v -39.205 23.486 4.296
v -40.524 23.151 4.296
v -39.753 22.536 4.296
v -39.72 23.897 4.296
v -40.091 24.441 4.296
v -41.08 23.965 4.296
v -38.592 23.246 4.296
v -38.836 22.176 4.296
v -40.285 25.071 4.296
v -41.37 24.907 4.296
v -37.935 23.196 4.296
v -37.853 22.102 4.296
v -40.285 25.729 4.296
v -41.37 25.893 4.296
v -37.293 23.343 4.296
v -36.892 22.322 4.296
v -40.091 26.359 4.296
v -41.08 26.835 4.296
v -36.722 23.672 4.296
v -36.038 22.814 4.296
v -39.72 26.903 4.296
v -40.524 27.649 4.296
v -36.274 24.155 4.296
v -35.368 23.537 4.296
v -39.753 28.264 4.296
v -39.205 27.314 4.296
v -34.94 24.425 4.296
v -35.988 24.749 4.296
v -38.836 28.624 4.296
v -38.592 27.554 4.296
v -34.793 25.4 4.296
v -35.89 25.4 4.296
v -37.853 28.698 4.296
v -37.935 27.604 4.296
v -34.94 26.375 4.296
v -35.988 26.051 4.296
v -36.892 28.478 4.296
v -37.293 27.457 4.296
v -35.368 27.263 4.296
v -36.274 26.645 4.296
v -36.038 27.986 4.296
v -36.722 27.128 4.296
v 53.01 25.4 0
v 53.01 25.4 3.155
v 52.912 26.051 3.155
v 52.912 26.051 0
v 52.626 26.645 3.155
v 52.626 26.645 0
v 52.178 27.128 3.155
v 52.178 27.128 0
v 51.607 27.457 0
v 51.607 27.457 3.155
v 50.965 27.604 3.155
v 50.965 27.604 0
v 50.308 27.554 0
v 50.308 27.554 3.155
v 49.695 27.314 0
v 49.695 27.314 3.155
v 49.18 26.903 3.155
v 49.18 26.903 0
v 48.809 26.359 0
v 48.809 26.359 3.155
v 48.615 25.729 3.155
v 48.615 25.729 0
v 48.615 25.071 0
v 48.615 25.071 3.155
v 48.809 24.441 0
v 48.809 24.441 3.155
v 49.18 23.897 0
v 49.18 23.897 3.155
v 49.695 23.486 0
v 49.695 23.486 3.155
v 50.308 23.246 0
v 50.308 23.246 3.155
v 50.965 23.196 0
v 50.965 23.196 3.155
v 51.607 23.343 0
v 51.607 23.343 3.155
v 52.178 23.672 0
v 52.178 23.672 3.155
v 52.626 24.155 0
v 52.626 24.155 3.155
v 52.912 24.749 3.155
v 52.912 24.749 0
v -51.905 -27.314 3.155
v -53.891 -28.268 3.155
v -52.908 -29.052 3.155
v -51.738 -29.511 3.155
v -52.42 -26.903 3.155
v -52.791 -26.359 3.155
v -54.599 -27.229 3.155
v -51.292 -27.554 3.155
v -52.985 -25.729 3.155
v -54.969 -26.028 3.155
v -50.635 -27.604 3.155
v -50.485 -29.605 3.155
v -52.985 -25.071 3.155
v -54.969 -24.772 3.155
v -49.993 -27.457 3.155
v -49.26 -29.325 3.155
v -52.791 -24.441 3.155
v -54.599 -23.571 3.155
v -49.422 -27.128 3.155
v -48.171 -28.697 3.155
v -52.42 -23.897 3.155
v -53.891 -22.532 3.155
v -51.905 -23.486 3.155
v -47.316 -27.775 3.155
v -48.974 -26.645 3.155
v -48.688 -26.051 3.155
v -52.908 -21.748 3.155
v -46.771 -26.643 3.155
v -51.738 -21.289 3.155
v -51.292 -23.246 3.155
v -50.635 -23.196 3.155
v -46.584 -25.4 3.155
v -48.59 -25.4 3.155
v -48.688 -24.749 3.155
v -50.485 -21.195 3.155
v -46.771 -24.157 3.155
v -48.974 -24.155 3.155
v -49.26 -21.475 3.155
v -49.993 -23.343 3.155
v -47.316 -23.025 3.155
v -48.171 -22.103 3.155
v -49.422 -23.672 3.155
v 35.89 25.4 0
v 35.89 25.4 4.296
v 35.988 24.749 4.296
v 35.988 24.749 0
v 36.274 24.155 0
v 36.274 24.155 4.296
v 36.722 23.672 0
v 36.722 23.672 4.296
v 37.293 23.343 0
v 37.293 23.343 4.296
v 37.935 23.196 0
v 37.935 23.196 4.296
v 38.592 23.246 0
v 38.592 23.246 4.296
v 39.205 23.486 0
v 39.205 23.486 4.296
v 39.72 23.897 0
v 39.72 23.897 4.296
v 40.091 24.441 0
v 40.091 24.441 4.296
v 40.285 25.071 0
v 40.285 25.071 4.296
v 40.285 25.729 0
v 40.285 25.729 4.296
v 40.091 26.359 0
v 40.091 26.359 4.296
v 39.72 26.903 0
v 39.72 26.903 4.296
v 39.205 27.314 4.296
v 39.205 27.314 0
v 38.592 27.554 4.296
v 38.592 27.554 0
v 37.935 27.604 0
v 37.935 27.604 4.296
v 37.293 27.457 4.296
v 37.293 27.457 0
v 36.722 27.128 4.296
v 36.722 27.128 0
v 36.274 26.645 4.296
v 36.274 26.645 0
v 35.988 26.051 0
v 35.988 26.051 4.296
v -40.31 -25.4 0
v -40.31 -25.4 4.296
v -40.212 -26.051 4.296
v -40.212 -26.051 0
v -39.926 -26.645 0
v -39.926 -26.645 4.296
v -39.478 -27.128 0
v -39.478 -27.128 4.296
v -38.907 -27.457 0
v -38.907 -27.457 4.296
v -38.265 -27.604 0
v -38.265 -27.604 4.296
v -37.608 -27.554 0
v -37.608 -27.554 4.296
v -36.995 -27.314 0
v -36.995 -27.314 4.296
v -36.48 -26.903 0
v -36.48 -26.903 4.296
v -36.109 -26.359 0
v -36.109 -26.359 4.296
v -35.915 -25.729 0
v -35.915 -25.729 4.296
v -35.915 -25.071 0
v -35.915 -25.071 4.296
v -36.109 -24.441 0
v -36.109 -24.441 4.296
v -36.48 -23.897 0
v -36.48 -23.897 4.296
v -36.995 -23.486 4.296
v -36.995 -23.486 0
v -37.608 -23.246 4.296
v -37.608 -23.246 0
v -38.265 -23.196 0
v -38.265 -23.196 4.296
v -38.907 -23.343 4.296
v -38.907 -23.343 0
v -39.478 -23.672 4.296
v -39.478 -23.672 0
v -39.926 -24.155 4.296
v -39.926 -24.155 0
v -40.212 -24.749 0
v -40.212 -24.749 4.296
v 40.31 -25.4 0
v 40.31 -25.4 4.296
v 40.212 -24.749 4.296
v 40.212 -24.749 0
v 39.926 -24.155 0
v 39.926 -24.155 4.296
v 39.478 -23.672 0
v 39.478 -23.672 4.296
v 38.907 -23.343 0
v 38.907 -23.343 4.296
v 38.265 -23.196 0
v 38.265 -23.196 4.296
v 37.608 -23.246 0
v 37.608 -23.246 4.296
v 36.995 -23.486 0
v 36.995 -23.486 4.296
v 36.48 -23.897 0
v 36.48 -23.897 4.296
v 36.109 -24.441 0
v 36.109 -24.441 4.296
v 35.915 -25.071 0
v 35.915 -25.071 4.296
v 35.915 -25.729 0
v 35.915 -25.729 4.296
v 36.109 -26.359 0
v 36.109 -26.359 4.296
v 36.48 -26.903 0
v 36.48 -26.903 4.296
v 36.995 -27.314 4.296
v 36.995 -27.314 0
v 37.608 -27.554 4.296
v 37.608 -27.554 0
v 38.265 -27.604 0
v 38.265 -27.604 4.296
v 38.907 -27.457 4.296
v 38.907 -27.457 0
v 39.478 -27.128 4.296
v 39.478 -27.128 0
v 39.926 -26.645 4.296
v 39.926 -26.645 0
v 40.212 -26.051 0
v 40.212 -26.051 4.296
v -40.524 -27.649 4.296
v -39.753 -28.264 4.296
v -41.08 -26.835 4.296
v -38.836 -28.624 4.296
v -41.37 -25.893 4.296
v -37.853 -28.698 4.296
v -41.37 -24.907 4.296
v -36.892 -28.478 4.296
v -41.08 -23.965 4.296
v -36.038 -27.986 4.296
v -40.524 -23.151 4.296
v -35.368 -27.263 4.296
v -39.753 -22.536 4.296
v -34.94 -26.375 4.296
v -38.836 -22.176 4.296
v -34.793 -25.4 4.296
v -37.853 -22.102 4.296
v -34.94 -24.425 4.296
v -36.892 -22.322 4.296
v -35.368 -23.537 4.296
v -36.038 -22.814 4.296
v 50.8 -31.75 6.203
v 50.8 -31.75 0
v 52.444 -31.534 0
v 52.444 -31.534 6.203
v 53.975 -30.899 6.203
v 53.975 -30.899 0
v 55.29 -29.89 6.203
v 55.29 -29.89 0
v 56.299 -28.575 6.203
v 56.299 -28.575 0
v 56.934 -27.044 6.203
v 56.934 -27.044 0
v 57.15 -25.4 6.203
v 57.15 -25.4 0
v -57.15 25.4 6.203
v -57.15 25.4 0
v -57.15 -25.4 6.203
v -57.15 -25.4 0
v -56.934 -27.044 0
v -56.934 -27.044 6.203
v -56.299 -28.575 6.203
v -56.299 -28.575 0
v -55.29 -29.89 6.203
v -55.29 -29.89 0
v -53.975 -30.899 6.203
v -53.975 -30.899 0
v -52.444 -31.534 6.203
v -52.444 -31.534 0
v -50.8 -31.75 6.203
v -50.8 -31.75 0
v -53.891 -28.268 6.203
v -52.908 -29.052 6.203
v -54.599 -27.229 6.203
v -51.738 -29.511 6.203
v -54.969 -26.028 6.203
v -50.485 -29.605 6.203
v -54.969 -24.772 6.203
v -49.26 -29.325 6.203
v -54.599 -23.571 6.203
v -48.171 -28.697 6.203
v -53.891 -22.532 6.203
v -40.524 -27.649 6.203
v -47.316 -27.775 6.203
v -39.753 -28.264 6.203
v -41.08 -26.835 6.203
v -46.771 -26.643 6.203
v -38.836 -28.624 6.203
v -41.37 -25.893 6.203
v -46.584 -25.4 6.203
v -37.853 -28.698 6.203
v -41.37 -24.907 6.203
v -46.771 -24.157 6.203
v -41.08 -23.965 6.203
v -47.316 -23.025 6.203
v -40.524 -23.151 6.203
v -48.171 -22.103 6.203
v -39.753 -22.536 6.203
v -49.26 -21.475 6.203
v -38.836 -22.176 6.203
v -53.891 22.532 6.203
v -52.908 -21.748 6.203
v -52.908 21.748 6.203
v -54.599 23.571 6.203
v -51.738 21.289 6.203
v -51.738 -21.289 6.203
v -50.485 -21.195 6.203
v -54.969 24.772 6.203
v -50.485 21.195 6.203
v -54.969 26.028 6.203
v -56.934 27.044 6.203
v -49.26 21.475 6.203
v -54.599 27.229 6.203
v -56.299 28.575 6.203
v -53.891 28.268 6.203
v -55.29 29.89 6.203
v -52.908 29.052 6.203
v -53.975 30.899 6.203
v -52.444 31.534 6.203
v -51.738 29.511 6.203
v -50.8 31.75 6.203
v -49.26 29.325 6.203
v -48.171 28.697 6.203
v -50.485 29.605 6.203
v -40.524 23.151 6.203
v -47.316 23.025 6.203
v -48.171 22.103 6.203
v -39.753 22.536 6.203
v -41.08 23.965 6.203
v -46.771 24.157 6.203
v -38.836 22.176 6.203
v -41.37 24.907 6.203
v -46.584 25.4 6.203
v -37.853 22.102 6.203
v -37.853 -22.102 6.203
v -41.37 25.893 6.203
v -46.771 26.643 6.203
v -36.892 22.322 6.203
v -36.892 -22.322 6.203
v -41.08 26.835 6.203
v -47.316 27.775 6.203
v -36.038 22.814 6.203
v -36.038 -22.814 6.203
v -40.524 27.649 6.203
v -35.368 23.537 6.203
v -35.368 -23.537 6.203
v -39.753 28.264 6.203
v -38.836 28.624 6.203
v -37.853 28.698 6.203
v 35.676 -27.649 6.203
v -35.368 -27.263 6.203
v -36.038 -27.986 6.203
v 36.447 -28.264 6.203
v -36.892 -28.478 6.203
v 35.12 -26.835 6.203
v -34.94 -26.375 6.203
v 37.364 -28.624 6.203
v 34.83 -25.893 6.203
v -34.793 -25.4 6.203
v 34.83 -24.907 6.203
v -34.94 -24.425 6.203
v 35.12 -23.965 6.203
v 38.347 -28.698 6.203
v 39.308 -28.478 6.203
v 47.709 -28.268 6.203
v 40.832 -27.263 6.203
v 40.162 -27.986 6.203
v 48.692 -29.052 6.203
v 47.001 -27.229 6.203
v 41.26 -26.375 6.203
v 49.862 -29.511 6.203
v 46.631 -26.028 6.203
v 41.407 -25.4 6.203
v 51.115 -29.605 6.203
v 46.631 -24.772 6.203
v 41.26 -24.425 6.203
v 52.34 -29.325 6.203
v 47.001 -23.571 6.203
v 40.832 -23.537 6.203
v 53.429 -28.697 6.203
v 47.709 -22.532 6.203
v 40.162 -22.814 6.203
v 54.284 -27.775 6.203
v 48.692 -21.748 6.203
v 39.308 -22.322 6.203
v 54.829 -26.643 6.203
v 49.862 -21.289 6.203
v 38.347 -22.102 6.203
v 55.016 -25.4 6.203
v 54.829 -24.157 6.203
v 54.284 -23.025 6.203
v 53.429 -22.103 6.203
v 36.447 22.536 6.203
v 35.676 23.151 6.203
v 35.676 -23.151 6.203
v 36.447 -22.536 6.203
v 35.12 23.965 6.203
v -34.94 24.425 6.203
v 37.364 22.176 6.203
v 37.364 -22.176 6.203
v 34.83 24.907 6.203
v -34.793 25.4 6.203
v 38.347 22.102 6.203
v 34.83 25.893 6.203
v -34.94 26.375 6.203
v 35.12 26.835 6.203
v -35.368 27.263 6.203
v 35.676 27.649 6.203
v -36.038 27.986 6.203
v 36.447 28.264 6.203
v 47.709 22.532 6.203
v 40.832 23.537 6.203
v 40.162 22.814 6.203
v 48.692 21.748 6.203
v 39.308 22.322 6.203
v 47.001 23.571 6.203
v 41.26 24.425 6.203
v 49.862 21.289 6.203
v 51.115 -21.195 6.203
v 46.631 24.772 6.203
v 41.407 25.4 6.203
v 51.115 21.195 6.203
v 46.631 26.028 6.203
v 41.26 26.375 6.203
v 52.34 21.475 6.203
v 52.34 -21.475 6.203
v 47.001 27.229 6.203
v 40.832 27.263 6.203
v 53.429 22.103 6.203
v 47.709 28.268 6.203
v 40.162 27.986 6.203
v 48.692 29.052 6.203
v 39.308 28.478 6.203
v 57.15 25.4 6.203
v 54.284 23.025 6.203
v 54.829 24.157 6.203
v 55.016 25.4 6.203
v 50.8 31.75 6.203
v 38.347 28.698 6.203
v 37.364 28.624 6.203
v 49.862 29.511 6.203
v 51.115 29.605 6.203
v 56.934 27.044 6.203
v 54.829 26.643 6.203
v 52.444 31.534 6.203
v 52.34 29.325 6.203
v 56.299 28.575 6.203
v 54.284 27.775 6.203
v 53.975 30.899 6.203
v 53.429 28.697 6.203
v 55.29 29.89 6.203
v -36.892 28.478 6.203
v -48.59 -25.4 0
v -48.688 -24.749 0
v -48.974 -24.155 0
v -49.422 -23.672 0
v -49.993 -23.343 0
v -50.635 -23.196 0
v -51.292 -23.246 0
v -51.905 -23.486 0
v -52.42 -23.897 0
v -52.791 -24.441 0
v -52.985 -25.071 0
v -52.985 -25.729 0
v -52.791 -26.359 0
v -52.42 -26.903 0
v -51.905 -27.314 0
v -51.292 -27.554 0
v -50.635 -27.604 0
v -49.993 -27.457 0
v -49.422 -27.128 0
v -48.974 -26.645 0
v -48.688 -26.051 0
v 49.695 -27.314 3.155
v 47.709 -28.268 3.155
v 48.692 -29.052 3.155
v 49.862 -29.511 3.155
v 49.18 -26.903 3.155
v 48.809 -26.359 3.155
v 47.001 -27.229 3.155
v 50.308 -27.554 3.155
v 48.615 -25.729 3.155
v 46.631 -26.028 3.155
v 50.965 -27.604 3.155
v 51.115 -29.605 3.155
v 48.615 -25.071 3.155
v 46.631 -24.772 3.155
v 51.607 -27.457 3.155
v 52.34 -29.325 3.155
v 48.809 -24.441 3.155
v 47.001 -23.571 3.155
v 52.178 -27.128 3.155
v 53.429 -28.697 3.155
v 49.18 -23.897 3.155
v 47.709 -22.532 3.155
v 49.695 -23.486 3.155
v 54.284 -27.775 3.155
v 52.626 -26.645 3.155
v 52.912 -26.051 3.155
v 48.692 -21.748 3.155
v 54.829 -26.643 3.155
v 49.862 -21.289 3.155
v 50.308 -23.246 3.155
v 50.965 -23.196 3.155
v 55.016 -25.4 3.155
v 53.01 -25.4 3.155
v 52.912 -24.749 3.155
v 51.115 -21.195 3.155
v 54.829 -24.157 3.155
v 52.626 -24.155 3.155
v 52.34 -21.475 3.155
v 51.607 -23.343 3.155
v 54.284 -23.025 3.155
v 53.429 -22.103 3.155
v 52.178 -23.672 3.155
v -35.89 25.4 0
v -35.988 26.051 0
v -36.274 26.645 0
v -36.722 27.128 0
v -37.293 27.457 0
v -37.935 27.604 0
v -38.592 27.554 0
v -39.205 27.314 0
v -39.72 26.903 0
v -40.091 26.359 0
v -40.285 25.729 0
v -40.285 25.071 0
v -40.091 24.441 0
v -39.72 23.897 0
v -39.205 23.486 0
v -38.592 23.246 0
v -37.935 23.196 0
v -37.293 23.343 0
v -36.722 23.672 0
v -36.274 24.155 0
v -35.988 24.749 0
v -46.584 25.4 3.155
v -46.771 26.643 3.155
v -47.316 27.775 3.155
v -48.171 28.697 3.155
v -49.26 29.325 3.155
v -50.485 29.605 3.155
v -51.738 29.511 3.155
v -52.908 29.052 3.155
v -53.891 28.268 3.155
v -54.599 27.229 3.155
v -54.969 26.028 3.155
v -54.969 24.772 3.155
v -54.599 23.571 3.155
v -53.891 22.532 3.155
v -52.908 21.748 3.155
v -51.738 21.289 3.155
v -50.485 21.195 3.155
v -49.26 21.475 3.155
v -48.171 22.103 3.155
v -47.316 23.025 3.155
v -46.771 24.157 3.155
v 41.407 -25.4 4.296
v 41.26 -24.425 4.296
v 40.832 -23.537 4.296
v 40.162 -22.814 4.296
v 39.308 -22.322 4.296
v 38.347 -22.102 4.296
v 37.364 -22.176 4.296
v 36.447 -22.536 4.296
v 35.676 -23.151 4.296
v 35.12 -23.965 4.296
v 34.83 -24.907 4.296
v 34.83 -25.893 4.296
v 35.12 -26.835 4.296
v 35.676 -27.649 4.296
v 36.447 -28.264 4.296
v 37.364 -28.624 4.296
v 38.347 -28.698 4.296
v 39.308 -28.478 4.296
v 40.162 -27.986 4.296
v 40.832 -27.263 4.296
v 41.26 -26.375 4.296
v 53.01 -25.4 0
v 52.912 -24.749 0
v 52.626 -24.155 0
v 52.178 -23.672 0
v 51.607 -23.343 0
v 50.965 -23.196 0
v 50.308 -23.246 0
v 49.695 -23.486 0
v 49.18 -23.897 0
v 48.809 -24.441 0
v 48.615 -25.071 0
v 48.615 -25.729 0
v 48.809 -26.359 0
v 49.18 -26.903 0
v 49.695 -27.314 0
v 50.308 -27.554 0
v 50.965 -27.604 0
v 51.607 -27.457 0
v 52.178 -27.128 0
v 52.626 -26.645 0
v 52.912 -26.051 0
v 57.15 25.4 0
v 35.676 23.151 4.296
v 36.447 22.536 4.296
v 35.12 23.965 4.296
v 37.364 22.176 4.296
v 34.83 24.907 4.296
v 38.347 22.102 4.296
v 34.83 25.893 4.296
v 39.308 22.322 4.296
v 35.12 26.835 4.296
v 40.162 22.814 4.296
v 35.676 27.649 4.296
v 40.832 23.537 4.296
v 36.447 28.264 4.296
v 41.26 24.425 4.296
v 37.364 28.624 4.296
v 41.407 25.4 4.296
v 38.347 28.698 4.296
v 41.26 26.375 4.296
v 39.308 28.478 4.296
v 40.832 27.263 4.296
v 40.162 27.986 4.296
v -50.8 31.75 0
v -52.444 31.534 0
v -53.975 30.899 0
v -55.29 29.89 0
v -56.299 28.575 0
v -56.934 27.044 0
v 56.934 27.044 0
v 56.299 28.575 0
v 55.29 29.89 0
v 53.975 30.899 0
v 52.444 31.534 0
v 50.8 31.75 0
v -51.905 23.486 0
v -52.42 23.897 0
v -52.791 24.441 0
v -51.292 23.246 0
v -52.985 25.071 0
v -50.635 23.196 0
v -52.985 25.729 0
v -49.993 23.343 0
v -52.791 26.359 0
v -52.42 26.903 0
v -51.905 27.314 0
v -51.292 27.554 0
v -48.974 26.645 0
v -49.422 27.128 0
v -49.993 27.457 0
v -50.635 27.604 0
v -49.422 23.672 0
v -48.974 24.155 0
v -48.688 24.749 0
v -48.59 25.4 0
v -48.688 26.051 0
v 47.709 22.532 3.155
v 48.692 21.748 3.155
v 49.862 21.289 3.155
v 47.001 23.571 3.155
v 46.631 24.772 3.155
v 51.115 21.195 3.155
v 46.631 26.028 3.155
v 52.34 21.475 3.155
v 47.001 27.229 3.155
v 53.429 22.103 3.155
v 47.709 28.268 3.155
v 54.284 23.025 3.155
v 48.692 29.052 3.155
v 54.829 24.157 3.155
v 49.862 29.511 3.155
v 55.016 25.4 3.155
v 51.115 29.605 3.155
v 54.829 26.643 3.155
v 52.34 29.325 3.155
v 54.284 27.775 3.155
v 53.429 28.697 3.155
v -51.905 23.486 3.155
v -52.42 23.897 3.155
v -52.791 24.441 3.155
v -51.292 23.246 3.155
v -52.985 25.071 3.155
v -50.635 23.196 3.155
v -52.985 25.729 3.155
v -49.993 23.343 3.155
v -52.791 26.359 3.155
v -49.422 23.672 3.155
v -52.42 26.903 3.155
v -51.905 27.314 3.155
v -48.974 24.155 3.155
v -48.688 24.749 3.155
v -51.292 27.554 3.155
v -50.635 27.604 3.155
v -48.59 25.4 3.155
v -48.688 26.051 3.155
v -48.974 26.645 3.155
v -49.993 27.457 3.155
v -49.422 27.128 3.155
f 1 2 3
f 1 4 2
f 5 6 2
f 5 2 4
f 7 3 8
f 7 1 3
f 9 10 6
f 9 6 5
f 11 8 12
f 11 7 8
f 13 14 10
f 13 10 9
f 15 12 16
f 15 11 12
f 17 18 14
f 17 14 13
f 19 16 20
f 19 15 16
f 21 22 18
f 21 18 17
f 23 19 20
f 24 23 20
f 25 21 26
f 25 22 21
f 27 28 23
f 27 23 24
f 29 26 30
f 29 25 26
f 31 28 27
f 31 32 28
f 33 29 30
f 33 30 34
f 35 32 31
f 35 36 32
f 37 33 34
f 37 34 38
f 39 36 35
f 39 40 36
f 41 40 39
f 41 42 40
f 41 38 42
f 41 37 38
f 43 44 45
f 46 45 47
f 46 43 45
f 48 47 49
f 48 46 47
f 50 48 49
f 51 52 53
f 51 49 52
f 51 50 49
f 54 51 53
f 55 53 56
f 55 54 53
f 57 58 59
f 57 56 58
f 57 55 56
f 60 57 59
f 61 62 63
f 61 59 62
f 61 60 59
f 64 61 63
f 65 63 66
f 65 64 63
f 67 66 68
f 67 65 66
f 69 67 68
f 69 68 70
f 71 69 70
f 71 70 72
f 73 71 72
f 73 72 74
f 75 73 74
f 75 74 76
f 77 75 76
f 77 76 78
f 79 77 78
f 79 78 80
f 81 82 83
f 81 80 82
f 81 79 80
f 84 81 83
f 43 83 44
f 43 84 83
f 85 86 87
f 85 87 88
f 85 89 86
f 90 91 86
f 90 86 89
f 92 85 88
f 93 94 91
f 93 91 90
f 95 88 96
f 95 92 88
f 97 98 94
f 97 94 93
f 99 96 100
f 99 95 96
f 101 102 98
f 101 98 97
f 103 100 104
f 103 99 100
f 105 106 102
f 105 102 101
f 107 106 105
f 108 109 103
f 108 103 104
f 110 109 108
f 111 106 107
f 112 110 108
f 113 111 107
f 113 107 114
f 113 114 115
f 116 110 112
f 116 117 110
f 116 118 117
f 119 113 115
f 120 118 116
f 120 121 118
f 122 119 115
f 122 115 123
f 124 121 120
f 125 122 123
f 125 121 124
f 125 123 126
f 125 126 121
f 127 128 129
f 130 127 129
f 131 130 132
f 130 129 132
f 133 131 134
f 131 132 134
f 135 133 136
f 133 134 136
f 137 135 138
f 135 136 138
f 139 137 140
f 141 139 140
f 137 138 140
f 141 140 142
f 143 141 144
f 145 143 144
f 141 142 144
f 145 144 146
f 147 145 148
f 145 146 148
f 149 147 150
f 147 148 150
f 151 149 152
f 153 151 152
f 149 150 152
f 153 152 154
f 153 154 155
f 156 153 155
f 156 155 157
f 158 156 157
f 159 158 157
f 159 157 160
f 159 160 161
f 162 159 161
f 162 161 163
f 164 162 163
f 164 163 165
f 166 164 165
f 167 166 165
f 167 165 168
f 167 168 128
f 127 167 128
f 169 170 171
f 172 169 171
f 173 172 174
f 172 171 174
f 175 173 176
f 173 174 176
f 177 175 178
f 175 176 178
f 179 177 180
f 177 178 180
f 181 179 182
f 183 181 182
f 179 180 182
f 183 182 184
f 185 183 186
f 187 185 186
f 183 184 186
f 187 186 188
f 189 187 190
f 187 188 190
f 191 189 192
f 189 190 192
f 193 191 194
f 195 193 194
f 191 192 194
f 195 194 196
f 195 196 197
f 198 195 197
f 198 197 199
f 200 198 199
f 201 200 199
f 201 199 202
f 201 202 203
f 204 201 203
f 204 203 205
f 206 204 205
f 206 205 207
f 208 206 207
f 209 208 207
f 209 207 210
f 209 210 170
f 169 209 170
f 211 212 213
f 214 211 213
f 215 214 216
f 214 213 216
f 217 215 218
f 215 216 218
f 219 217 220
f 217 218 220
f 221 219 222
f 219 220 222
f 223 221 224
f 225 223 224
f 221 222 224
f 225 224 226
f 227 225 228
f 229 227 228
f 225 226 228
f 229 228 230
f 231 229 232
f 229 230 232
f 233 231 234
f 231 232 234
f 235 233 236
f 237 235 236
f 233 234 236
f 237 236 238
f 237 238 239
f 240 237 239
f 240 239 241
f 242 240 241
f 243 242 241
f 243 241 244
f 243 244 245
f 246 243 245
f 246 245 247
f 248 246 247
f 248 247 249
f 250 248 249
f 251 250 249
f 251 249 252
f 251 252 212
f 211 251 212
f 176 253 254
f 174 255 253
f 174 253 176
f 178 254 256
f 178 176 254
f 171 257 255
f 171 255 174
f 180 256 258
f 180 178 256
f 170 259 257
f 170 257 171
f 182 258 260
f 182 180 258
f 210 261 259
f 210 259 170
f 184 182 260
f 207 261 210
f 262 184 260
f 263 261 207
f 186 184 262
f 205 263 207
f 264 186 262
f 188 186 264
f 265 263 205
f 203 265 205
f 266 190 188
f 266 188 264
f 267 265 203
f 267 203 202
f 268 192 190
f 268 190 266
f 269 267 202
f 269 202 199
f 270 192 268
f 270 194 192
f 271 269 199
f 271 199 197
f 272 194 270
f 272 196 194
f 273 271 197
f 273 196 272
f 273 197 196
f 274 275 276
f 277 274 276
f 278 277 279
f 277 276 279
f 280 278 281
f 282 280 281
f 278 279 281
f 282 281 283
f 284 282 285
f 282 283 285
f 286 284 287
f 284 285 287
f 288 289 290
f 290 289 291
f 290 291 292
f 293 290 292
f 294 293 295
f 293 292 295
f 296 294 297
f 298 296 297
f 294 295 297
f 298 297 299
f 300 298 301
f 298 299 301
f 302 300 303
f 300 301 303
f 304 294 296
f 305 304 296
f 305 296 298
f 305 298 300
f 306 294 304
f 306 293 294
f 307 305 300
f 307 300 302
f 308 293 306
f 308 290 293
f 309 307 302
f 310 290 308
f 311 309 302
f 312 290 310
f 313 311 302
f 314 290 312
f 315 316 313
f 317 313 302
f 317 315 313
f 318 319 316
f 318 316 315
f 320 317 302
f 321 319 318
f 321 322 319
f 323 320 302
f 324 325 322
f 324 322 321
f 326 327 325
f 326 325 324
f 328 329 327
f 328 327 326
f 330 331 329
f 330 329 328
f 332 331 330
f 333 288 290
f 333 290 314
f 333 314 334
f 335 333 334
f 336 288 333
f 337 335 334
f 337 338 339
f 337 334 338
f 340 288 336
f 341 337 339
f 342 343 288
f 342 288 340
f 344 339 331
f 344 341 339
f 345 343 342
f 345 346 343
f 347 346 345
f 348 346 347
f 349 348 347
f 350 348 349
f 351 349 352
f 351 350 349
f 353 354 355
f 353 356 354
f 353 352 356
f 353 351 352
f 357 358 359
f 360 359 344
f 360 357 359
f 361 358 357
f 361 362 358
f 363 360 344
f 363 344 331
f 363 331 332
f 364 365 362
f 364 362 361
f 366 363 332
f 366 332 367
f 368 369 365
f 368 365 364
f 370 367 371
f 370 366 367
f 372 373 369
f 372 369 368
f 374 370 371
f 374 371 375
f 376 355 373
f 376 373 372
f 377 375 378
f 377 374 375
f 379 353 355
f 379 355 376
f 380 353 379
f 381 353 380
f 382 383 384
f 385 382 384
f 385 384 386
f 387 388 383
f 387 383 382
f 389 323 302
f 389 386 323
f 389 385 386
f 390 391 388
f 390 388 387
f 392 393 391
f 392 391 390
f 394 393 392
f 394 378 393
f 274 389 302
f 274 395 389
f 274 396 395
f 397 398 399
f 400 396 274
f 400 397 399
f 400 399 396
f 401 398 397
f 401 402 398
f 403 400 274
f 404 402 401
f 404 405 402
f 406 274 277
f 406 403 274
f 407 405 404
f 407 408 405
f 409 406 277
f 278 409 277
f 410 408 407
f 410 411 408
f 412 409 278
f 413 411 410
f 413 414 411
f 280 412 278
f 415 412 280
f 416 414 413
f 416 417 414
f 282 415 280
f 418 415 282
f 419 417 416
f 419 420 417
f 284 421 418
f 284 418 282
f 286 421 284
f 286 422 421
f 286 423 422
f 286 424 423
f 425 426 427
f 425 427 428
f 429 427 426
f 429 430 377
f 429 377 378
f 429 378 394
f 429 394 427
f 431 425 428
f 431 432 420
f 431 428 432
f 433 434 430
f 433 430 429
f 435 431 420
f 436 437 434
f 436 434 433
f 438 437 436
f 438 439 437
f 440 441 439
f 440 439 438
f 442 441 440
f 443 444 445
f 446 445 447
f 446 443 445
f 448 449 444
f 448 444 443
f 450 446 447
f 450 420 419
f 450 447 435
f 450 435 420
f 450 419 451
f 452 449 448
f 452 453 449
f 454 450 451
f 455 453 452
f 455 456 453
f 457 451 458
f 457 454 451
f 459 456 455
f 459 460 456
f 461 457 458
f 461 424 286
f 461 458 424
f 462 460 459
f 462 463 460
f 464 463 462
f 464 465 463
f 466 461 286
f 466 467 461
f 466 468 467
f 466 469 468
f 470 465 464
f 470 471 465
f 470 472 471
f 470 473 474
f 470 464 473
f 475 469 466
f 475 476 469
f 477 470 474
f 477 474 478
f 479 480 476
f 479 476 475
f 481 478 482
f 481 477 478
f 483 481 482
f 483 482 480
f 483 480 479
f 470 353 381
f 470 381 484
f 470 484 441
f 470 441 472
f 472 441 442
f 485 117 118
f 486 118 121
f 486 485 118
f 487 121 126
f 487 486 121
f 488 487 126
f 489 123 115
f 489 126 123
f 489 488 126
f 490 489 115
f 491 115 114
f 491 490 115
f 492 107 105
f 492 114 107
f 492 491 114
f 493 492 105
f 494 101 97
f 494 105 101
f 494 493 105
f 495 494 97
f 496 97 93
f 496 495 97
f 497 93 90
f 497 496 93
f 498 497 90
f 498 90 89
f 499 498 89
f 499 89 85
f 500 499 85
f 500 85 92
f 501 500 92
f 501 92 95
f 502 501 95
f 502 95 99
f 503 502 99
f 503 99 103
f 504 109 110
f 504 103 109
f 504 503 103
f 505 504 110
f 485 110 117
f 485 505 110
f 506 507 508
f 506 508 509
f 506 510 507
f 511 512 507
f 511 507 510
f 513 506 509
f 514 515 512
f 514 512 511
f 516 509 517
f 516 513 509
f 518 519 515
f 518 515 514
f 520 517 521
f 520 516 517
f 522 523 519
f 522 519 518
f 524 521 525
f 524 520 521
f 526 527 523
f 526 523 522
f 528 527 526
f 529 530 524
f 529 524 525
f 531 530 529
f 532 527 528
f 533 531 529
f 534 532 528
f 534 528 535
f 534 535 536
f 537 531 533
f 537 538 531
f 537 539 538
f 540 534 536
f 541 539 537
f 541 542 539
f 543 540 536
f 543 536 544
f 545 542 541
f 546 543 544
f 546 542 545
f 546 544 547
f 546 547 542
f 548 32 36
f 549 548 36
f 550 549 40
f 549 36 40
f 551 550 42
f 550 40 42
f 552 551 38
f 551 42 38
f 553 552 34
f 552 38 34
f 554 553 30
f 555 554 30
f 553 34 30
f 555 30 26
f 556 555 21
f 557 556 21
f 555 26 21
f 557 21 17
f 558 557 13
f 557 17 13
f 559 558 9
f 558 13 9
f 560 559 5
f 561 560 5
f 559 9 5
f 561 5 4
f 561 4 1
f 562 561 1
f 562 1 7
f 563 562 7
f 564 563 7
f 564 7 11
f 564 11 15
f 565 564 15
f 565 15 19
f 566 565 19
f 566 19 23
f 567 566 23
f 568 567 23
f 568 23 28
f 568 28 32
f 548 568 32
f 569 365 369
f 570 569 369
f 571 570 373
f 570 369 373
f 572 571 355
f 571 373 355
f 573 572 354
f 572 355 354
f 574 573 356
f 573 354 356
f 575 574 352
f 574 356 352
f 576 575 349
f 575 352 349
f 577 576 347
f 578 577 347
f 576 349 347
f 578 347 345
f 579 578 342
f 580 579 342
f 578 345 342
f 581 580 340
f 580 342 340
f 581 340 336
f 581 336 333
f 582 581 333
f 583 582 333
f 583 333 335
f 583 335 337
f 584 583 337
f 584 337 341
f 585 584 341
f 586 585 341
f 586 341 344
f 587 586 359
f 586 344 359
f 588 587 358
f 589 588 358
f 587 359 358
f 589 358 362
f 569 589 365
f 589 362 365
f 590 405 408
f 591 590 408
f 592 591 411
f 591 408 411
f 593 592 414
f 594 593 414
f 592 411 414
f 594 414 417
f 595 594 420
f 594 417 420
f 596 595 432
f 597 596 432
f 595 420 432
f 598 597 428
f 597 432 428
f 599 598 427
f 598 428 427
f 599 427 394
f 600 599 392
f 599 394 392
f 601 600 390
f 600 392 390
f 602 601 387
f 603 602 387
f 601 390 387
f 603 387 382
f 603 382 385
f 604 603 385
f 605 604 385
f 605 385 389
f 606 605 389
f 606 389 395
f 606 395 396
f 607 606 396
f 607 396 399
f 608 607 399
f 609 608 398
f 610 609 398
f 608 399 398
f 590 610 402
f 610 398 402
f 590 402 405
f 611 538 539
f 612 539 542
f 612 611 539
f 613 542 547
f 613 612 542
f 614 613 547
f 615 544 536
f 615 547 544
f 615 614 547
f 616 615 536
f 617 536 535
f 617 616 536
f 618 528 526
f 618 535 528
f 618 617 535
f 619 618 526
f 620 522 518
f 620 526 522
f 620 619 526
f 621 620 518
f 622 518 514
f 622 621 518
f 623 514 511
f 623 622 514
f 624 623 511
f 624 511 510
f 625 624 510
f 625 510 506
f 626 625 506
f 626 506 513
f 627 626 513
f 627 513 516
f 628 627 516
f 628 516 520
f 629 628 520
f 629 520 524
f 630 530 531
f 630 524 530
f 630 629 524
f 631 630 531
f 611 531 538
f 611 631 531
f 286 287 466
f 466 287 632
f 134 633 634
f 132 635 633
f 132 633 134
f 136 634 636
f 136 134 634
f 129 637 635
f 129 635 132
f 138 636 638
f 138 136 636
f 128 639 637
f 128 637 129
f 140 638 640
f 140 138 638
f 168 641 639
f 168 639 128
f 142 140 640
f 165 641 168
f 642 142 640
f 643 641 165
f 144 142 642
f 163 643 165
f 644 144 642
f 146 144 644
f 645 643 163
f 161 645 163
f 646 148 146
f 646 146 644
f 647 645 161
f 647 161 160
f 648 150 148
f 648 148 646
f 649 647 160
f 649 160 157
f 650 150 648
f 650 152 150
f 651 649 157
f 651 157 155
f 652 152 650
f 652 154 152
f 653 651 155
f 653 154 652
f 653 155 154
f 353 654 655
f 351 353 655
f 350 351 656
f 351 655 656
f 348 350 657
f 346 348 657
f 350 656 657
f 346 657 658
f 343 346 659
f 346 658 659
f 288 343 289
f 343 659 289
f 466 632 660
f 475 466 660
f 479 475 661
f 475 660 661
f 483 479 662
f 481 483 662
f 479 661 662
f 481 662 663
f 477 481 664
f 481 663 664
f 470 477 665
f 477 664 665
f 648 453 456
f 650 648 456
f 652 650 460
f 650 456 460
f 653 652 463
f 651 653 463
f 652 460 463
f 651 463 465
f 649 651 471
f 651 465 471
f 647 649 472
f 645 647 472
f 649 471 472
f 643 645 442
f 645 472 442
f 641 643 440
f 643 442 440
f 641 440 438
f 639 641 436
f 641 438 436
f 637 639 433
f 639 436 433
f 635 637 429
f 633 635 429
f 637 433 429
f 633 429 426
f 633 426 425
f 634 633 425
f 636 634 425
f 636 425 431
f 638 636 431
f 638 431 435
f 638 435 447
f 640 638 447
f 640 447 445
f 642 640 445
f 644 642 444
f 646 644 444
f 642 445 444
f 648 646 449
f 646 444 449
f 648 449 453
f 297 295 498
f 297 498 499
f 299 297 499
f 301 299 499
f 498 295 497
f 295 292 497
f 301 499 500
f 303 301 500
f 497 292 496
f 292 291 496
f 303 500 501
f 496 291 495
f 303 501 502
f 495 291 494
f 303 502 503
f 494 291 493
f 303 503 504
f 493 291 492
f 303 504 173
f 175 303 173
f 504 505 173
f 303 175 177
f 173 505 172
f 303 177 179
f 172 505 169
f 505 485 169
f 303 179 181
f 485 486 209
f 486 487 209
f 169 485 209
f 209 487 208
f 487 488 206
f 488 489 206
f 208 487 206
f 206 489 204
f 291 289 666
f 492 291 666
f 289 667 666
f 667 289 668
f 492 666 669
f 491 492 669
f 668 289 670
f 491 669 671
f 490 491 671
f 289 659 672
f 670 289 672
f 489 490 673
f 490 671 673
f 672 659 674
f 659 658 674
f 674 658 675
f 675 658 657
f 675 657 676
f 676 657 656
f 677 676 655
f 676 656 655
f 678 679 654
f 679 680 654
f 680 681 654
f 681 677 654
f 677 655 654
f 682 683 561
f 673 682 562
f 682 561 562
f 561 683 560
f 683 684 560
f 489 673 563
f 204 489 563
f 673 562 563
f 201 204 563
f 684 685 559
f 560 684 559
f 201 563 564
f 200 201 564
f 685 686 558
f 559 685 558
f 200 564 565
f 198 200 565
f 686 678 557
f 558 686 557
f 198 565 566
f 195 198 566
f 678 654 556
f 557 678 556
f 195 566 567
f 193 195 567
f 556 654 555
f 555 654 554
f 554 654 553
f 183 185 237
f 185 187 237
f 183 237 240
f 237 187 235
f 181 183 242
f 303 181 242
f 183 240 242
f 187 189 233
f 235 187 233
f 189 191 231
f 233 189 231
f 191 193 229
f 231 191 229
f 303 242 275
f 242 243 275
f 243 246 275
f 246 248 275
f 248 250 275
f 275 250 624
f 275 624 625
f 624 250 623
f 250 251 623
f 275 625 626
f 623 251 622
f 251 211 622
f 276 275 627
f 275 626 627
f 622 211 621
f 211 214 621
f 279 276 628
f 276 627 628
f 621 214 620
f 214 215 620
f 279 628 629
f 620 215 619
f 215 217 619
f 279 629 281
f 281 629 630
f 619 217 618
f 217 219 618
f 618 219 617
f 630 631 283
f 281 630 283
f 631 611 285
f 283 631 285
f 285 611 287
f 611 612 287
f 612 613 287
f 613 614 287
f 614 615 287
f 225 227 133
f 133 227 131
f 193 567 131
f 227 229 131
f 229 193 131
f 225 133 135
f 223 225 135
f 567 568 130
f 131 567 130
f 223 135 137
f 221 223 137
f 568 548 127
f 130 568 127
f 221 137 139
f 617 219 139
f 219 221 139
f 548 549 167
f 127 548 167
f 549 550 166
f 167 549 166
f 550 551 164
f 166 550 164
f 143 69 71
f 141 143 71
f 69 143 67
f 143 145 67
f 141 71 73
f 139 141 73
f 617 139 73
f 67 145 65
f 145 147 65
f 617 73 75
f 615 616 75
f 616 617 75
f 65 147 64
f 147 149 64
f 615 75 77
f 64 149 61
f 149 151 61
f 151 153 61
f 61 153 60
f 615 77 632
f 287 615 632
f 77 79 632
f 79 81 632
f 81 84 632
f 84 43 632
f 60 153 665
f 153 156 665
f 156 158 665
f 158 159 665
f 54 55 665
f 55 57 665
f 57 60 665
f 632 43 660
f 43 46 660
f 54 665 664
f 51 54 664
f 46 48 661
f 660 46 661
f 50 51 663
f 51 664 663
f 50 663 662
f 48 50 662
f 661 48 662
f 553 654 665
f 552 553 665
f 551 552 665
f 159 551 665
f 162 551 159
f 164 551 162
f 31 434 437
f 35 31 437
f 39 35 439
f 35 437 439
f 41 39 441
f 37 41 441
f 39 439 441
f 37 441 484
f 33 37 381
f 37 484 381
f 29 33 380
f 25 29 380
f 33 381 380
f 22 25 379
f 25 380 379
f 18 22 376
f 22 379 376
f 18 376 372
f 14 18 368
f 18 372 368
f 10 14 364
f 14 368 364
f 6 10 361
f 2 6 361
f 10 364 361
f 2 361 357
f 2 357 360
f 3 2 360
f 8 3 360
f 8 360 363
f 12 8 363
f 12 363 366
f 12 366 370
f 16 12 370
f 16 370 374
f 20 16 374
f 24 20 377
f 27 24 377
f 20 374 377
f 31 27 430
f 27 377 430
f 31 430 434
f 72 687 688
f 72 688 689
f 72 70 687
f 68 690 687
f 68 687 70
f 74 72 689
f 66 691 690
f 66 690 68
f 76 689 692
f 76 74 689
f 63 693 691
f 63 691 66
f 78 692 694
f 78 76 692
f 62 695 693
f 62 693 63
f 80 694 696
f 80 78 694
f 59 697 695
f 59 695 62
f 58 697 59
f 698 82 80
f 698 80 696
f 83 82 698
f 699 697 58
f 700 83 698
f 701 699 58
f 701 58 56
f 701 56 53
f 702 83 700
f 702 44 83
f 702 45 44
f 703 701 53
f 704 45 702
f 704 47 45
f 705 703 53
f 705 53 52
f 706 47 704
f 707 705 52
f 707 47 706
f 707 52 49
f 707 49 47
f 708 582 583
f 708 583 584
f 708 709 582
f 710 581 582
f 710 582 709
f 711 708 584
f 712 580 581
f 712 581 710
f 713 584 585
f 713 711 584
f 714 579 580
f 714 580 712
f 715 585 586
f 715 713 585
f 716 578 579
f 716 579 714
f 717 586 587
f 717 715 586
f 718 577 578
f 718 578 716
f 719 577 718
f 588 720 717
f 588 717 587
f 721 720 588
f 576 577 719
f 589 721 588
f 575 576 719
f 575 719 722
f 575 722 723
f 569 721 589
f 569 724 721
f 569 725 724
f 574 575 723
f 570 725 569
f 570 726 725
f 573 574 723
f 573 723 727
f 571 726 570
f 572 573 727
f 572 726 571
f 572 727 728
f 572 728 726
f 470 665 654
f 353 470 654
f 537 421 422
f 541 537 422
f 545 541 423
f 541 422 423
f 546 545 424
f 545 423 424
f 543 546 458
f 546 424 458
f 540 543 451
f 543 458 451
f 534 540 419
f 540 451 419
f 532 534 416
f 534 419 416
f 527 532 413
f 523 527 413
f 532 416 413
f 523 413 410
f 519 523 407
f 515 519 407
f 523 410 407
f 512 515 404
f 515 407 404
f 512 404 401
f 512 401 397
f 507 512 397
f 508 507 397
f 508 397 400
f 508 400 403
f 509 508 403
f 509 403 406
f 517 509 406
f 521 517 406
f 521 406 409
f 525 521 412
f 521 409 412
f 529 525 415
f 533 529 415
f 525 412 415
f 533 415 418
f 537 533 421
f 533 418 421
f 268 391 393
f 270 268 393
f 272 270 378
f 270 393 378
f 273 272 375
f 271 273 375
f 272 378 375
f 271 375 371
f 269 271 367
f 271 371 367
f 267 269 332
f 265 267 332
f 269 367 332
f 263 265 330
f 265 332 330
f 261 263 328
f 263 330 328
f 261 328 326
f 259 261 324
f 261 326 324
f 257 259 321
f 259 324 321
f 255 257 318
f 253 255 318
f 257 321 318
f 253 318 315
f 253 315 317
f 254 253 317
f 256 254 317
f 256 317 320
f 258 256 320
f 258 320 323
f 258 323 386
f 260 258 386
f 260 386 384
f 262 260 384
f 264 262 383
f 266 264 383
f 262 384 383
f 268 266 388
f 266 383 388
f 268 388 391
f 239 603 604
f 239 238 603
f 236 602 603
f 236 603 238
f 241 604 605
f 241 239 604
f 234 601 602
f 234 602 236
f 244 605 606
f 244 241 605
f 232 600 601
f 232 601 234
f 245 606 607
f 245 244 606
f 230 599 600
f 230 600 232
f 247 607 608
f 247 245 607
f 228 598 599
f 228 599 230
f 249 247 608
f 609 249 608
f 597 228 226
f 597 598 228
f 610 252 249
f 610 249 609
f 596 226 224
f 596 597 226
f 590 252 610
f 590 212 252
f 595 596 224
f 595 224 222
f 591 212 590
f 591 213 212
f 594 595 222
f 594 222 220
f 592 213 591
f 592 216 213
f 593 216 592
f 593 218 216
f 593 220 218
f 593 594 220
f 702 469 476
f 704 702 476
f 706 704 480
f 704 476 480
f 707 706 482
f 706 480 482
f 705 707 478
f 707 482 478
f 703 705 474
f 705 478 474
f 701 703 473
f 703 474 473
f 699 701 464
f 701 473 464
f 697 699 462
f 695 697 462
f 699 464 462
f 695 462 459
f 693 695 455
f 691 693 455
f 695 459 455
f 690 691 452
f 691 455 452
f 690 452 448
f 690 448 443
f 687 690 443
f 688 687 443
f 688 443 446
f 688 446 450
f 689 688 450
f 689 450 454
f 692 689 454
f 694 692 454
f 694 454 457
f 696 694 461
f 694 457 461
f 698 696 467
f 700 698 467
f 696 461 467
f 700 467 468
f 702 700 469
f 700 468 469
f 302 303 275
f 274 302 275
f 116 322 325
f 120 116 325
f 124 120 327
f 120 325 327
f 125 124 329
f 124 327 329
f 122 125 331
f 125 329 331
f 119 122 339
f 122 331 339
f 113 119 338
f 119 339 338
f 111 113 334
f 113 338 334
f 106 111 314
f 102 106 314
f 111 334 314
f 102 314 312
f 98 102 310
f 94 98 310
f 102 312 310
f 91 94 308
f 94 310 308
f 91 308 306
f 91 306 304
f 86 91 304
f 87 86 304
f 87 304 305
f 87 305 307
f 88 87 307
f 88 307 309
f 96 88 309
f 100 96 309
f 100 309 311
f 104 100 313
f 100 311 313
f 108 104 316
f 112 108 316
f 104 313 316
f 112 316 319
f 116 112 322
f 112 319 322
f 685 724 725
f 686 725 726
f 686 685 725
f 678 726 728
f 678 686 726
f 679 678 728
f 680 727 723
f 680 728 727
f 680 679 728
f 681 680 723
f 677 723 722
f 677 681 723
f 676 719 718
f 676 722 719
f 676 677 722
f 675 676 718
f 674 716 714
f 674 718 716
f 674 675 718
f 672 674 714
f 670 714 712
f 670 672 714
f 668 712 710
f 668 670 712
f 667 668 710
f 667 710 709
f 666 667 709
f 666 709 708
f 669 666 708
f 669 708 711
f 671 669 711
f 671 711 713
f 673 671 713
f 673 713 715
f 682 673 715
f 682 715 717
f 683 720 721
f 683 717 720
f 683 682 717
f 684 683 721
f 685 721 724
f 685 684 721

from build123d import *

# Parameters (mm, degrees)
SKETCH1_R           = 2.2098
BOSS_EXTRUDE1_DEPTH = 6.20300004
SKETCH2_R           = 4.2164
CUT_EXTRUDE1_DEPTH  = 3.048
SKETCH3_R           = 2.2098
CUT_EXTRUDE2_DEPTH  = 66.670862713
SKETCH4_R           = 3.30699999
CUT_EXTRUDE3_DEPTH  = 1.906999996


with BuildPart() as part:
    # Sketch1 → Boss-Extrude1 (new body)
    with BuildSketch(Plane.XY):
        with BuildLine():
            Line((-50.8, -31.75), (50.8, -31.75))
            ThreePointArc((50.8, -31.75), (55.290128061, -29.890128061), (57.15, -25.4))
            Line((57.15, -25.4), (57.15, 25.4))
            ThreePointArc((57.15, 25.4), (55.290128061, 29.890128061), (50.8, 31.75))
            Line((50.8, 31.75), (-50.8, 31.75))
            ThreePointArc((-50.8, 31.75), (-55.290128061, 29.890128061), (-57.15, 25.4))
            Line((-57.15, 25.4), (-57.15, -25.4))
            ThreePointArc((-57.15, -25.4), (-55.290128061, -29.890128061), (-50.8, -31.75))
        make_face()
        with Locations((-50.8, -25.4)):
            Circle(SKETCH1_R, mode=Mode.SUBTRACT)
        with Locations((-50.8, 25.4)):
            Circle(SKETCH1_R, mode=Mode.SUBTRACT)
        with Locations((50.8, 25.4)):
            Circle(SKETCH1_R, mode=Mode.SUBTRACT)
        with Locations((50.8, -25.4)):
            Circle(SKETCH1_R, mode=Mode.SUBTRACT)
    extrude(amount=BOSS_EXTRUDE1_DEPTH)

    # Sketch2 → Cut-Extrude1 (cut)
    with BuildSketch(Plane.XY.offset(6.20300004)):
        with Locations((-50.8, 25.4)):
            Circle(SKETCH2_R)
        with Locations((50.8, 25.4)):
            Circle(SKETCH2_R)
        with Locations((50.8, -25.4)):
            Circle(SKETCH2_R)
        with Locations((-50.8, -25.4)):
            Circle(SKETCH2_R)
    extrude(amount=-CUT_EXTRUDE1_DEPTH, mode=Mode.SUBTRACT)

    # Sketch3 → Cut-Extrude2 (cut, through all)
    with BuildSketch(Plane.XY.offset(6.20300004)):
        with Locations((-38.1, 25.4)):
            Circle(SKETCH3_R)
        with Locations(Location((38.1, 25.4, 0), (0, 0, 180))):
            Circle(SKETCH3_R)
        with Locations((38.1, -25.4)):
            Circle(SKETCH3_R)
        with Locations(Location((-38.1, -25.4, 0), (0, 0, 180))):
            Circle(SKETCH3_R)
    extrude(amount=-CUT_EXTRUDE2_DEPTH, mode=Mode.SUBTRACT)

    # Sketch4 → Cut-Extrude3 (cut)
    with BuildSketch(Plane.XY.offset(6.20300004)):
        with Locations((-38.1, 25.4)):
            Circle(SKETCH4_R)
        with Locations((38.1, 25.4)):
            Circle(SKETCH4_R)
        with Locations((38.1, -25.4)):
            Circle(SKETCH4_R)
        with Locations((-38.1, -25.4)):
            Circle(SKETCH4_R)
    extrude(amount=-CUT_EXTRUDE3_DEPTH, mode=Mode.SUBTRACT)


solid = part.part
